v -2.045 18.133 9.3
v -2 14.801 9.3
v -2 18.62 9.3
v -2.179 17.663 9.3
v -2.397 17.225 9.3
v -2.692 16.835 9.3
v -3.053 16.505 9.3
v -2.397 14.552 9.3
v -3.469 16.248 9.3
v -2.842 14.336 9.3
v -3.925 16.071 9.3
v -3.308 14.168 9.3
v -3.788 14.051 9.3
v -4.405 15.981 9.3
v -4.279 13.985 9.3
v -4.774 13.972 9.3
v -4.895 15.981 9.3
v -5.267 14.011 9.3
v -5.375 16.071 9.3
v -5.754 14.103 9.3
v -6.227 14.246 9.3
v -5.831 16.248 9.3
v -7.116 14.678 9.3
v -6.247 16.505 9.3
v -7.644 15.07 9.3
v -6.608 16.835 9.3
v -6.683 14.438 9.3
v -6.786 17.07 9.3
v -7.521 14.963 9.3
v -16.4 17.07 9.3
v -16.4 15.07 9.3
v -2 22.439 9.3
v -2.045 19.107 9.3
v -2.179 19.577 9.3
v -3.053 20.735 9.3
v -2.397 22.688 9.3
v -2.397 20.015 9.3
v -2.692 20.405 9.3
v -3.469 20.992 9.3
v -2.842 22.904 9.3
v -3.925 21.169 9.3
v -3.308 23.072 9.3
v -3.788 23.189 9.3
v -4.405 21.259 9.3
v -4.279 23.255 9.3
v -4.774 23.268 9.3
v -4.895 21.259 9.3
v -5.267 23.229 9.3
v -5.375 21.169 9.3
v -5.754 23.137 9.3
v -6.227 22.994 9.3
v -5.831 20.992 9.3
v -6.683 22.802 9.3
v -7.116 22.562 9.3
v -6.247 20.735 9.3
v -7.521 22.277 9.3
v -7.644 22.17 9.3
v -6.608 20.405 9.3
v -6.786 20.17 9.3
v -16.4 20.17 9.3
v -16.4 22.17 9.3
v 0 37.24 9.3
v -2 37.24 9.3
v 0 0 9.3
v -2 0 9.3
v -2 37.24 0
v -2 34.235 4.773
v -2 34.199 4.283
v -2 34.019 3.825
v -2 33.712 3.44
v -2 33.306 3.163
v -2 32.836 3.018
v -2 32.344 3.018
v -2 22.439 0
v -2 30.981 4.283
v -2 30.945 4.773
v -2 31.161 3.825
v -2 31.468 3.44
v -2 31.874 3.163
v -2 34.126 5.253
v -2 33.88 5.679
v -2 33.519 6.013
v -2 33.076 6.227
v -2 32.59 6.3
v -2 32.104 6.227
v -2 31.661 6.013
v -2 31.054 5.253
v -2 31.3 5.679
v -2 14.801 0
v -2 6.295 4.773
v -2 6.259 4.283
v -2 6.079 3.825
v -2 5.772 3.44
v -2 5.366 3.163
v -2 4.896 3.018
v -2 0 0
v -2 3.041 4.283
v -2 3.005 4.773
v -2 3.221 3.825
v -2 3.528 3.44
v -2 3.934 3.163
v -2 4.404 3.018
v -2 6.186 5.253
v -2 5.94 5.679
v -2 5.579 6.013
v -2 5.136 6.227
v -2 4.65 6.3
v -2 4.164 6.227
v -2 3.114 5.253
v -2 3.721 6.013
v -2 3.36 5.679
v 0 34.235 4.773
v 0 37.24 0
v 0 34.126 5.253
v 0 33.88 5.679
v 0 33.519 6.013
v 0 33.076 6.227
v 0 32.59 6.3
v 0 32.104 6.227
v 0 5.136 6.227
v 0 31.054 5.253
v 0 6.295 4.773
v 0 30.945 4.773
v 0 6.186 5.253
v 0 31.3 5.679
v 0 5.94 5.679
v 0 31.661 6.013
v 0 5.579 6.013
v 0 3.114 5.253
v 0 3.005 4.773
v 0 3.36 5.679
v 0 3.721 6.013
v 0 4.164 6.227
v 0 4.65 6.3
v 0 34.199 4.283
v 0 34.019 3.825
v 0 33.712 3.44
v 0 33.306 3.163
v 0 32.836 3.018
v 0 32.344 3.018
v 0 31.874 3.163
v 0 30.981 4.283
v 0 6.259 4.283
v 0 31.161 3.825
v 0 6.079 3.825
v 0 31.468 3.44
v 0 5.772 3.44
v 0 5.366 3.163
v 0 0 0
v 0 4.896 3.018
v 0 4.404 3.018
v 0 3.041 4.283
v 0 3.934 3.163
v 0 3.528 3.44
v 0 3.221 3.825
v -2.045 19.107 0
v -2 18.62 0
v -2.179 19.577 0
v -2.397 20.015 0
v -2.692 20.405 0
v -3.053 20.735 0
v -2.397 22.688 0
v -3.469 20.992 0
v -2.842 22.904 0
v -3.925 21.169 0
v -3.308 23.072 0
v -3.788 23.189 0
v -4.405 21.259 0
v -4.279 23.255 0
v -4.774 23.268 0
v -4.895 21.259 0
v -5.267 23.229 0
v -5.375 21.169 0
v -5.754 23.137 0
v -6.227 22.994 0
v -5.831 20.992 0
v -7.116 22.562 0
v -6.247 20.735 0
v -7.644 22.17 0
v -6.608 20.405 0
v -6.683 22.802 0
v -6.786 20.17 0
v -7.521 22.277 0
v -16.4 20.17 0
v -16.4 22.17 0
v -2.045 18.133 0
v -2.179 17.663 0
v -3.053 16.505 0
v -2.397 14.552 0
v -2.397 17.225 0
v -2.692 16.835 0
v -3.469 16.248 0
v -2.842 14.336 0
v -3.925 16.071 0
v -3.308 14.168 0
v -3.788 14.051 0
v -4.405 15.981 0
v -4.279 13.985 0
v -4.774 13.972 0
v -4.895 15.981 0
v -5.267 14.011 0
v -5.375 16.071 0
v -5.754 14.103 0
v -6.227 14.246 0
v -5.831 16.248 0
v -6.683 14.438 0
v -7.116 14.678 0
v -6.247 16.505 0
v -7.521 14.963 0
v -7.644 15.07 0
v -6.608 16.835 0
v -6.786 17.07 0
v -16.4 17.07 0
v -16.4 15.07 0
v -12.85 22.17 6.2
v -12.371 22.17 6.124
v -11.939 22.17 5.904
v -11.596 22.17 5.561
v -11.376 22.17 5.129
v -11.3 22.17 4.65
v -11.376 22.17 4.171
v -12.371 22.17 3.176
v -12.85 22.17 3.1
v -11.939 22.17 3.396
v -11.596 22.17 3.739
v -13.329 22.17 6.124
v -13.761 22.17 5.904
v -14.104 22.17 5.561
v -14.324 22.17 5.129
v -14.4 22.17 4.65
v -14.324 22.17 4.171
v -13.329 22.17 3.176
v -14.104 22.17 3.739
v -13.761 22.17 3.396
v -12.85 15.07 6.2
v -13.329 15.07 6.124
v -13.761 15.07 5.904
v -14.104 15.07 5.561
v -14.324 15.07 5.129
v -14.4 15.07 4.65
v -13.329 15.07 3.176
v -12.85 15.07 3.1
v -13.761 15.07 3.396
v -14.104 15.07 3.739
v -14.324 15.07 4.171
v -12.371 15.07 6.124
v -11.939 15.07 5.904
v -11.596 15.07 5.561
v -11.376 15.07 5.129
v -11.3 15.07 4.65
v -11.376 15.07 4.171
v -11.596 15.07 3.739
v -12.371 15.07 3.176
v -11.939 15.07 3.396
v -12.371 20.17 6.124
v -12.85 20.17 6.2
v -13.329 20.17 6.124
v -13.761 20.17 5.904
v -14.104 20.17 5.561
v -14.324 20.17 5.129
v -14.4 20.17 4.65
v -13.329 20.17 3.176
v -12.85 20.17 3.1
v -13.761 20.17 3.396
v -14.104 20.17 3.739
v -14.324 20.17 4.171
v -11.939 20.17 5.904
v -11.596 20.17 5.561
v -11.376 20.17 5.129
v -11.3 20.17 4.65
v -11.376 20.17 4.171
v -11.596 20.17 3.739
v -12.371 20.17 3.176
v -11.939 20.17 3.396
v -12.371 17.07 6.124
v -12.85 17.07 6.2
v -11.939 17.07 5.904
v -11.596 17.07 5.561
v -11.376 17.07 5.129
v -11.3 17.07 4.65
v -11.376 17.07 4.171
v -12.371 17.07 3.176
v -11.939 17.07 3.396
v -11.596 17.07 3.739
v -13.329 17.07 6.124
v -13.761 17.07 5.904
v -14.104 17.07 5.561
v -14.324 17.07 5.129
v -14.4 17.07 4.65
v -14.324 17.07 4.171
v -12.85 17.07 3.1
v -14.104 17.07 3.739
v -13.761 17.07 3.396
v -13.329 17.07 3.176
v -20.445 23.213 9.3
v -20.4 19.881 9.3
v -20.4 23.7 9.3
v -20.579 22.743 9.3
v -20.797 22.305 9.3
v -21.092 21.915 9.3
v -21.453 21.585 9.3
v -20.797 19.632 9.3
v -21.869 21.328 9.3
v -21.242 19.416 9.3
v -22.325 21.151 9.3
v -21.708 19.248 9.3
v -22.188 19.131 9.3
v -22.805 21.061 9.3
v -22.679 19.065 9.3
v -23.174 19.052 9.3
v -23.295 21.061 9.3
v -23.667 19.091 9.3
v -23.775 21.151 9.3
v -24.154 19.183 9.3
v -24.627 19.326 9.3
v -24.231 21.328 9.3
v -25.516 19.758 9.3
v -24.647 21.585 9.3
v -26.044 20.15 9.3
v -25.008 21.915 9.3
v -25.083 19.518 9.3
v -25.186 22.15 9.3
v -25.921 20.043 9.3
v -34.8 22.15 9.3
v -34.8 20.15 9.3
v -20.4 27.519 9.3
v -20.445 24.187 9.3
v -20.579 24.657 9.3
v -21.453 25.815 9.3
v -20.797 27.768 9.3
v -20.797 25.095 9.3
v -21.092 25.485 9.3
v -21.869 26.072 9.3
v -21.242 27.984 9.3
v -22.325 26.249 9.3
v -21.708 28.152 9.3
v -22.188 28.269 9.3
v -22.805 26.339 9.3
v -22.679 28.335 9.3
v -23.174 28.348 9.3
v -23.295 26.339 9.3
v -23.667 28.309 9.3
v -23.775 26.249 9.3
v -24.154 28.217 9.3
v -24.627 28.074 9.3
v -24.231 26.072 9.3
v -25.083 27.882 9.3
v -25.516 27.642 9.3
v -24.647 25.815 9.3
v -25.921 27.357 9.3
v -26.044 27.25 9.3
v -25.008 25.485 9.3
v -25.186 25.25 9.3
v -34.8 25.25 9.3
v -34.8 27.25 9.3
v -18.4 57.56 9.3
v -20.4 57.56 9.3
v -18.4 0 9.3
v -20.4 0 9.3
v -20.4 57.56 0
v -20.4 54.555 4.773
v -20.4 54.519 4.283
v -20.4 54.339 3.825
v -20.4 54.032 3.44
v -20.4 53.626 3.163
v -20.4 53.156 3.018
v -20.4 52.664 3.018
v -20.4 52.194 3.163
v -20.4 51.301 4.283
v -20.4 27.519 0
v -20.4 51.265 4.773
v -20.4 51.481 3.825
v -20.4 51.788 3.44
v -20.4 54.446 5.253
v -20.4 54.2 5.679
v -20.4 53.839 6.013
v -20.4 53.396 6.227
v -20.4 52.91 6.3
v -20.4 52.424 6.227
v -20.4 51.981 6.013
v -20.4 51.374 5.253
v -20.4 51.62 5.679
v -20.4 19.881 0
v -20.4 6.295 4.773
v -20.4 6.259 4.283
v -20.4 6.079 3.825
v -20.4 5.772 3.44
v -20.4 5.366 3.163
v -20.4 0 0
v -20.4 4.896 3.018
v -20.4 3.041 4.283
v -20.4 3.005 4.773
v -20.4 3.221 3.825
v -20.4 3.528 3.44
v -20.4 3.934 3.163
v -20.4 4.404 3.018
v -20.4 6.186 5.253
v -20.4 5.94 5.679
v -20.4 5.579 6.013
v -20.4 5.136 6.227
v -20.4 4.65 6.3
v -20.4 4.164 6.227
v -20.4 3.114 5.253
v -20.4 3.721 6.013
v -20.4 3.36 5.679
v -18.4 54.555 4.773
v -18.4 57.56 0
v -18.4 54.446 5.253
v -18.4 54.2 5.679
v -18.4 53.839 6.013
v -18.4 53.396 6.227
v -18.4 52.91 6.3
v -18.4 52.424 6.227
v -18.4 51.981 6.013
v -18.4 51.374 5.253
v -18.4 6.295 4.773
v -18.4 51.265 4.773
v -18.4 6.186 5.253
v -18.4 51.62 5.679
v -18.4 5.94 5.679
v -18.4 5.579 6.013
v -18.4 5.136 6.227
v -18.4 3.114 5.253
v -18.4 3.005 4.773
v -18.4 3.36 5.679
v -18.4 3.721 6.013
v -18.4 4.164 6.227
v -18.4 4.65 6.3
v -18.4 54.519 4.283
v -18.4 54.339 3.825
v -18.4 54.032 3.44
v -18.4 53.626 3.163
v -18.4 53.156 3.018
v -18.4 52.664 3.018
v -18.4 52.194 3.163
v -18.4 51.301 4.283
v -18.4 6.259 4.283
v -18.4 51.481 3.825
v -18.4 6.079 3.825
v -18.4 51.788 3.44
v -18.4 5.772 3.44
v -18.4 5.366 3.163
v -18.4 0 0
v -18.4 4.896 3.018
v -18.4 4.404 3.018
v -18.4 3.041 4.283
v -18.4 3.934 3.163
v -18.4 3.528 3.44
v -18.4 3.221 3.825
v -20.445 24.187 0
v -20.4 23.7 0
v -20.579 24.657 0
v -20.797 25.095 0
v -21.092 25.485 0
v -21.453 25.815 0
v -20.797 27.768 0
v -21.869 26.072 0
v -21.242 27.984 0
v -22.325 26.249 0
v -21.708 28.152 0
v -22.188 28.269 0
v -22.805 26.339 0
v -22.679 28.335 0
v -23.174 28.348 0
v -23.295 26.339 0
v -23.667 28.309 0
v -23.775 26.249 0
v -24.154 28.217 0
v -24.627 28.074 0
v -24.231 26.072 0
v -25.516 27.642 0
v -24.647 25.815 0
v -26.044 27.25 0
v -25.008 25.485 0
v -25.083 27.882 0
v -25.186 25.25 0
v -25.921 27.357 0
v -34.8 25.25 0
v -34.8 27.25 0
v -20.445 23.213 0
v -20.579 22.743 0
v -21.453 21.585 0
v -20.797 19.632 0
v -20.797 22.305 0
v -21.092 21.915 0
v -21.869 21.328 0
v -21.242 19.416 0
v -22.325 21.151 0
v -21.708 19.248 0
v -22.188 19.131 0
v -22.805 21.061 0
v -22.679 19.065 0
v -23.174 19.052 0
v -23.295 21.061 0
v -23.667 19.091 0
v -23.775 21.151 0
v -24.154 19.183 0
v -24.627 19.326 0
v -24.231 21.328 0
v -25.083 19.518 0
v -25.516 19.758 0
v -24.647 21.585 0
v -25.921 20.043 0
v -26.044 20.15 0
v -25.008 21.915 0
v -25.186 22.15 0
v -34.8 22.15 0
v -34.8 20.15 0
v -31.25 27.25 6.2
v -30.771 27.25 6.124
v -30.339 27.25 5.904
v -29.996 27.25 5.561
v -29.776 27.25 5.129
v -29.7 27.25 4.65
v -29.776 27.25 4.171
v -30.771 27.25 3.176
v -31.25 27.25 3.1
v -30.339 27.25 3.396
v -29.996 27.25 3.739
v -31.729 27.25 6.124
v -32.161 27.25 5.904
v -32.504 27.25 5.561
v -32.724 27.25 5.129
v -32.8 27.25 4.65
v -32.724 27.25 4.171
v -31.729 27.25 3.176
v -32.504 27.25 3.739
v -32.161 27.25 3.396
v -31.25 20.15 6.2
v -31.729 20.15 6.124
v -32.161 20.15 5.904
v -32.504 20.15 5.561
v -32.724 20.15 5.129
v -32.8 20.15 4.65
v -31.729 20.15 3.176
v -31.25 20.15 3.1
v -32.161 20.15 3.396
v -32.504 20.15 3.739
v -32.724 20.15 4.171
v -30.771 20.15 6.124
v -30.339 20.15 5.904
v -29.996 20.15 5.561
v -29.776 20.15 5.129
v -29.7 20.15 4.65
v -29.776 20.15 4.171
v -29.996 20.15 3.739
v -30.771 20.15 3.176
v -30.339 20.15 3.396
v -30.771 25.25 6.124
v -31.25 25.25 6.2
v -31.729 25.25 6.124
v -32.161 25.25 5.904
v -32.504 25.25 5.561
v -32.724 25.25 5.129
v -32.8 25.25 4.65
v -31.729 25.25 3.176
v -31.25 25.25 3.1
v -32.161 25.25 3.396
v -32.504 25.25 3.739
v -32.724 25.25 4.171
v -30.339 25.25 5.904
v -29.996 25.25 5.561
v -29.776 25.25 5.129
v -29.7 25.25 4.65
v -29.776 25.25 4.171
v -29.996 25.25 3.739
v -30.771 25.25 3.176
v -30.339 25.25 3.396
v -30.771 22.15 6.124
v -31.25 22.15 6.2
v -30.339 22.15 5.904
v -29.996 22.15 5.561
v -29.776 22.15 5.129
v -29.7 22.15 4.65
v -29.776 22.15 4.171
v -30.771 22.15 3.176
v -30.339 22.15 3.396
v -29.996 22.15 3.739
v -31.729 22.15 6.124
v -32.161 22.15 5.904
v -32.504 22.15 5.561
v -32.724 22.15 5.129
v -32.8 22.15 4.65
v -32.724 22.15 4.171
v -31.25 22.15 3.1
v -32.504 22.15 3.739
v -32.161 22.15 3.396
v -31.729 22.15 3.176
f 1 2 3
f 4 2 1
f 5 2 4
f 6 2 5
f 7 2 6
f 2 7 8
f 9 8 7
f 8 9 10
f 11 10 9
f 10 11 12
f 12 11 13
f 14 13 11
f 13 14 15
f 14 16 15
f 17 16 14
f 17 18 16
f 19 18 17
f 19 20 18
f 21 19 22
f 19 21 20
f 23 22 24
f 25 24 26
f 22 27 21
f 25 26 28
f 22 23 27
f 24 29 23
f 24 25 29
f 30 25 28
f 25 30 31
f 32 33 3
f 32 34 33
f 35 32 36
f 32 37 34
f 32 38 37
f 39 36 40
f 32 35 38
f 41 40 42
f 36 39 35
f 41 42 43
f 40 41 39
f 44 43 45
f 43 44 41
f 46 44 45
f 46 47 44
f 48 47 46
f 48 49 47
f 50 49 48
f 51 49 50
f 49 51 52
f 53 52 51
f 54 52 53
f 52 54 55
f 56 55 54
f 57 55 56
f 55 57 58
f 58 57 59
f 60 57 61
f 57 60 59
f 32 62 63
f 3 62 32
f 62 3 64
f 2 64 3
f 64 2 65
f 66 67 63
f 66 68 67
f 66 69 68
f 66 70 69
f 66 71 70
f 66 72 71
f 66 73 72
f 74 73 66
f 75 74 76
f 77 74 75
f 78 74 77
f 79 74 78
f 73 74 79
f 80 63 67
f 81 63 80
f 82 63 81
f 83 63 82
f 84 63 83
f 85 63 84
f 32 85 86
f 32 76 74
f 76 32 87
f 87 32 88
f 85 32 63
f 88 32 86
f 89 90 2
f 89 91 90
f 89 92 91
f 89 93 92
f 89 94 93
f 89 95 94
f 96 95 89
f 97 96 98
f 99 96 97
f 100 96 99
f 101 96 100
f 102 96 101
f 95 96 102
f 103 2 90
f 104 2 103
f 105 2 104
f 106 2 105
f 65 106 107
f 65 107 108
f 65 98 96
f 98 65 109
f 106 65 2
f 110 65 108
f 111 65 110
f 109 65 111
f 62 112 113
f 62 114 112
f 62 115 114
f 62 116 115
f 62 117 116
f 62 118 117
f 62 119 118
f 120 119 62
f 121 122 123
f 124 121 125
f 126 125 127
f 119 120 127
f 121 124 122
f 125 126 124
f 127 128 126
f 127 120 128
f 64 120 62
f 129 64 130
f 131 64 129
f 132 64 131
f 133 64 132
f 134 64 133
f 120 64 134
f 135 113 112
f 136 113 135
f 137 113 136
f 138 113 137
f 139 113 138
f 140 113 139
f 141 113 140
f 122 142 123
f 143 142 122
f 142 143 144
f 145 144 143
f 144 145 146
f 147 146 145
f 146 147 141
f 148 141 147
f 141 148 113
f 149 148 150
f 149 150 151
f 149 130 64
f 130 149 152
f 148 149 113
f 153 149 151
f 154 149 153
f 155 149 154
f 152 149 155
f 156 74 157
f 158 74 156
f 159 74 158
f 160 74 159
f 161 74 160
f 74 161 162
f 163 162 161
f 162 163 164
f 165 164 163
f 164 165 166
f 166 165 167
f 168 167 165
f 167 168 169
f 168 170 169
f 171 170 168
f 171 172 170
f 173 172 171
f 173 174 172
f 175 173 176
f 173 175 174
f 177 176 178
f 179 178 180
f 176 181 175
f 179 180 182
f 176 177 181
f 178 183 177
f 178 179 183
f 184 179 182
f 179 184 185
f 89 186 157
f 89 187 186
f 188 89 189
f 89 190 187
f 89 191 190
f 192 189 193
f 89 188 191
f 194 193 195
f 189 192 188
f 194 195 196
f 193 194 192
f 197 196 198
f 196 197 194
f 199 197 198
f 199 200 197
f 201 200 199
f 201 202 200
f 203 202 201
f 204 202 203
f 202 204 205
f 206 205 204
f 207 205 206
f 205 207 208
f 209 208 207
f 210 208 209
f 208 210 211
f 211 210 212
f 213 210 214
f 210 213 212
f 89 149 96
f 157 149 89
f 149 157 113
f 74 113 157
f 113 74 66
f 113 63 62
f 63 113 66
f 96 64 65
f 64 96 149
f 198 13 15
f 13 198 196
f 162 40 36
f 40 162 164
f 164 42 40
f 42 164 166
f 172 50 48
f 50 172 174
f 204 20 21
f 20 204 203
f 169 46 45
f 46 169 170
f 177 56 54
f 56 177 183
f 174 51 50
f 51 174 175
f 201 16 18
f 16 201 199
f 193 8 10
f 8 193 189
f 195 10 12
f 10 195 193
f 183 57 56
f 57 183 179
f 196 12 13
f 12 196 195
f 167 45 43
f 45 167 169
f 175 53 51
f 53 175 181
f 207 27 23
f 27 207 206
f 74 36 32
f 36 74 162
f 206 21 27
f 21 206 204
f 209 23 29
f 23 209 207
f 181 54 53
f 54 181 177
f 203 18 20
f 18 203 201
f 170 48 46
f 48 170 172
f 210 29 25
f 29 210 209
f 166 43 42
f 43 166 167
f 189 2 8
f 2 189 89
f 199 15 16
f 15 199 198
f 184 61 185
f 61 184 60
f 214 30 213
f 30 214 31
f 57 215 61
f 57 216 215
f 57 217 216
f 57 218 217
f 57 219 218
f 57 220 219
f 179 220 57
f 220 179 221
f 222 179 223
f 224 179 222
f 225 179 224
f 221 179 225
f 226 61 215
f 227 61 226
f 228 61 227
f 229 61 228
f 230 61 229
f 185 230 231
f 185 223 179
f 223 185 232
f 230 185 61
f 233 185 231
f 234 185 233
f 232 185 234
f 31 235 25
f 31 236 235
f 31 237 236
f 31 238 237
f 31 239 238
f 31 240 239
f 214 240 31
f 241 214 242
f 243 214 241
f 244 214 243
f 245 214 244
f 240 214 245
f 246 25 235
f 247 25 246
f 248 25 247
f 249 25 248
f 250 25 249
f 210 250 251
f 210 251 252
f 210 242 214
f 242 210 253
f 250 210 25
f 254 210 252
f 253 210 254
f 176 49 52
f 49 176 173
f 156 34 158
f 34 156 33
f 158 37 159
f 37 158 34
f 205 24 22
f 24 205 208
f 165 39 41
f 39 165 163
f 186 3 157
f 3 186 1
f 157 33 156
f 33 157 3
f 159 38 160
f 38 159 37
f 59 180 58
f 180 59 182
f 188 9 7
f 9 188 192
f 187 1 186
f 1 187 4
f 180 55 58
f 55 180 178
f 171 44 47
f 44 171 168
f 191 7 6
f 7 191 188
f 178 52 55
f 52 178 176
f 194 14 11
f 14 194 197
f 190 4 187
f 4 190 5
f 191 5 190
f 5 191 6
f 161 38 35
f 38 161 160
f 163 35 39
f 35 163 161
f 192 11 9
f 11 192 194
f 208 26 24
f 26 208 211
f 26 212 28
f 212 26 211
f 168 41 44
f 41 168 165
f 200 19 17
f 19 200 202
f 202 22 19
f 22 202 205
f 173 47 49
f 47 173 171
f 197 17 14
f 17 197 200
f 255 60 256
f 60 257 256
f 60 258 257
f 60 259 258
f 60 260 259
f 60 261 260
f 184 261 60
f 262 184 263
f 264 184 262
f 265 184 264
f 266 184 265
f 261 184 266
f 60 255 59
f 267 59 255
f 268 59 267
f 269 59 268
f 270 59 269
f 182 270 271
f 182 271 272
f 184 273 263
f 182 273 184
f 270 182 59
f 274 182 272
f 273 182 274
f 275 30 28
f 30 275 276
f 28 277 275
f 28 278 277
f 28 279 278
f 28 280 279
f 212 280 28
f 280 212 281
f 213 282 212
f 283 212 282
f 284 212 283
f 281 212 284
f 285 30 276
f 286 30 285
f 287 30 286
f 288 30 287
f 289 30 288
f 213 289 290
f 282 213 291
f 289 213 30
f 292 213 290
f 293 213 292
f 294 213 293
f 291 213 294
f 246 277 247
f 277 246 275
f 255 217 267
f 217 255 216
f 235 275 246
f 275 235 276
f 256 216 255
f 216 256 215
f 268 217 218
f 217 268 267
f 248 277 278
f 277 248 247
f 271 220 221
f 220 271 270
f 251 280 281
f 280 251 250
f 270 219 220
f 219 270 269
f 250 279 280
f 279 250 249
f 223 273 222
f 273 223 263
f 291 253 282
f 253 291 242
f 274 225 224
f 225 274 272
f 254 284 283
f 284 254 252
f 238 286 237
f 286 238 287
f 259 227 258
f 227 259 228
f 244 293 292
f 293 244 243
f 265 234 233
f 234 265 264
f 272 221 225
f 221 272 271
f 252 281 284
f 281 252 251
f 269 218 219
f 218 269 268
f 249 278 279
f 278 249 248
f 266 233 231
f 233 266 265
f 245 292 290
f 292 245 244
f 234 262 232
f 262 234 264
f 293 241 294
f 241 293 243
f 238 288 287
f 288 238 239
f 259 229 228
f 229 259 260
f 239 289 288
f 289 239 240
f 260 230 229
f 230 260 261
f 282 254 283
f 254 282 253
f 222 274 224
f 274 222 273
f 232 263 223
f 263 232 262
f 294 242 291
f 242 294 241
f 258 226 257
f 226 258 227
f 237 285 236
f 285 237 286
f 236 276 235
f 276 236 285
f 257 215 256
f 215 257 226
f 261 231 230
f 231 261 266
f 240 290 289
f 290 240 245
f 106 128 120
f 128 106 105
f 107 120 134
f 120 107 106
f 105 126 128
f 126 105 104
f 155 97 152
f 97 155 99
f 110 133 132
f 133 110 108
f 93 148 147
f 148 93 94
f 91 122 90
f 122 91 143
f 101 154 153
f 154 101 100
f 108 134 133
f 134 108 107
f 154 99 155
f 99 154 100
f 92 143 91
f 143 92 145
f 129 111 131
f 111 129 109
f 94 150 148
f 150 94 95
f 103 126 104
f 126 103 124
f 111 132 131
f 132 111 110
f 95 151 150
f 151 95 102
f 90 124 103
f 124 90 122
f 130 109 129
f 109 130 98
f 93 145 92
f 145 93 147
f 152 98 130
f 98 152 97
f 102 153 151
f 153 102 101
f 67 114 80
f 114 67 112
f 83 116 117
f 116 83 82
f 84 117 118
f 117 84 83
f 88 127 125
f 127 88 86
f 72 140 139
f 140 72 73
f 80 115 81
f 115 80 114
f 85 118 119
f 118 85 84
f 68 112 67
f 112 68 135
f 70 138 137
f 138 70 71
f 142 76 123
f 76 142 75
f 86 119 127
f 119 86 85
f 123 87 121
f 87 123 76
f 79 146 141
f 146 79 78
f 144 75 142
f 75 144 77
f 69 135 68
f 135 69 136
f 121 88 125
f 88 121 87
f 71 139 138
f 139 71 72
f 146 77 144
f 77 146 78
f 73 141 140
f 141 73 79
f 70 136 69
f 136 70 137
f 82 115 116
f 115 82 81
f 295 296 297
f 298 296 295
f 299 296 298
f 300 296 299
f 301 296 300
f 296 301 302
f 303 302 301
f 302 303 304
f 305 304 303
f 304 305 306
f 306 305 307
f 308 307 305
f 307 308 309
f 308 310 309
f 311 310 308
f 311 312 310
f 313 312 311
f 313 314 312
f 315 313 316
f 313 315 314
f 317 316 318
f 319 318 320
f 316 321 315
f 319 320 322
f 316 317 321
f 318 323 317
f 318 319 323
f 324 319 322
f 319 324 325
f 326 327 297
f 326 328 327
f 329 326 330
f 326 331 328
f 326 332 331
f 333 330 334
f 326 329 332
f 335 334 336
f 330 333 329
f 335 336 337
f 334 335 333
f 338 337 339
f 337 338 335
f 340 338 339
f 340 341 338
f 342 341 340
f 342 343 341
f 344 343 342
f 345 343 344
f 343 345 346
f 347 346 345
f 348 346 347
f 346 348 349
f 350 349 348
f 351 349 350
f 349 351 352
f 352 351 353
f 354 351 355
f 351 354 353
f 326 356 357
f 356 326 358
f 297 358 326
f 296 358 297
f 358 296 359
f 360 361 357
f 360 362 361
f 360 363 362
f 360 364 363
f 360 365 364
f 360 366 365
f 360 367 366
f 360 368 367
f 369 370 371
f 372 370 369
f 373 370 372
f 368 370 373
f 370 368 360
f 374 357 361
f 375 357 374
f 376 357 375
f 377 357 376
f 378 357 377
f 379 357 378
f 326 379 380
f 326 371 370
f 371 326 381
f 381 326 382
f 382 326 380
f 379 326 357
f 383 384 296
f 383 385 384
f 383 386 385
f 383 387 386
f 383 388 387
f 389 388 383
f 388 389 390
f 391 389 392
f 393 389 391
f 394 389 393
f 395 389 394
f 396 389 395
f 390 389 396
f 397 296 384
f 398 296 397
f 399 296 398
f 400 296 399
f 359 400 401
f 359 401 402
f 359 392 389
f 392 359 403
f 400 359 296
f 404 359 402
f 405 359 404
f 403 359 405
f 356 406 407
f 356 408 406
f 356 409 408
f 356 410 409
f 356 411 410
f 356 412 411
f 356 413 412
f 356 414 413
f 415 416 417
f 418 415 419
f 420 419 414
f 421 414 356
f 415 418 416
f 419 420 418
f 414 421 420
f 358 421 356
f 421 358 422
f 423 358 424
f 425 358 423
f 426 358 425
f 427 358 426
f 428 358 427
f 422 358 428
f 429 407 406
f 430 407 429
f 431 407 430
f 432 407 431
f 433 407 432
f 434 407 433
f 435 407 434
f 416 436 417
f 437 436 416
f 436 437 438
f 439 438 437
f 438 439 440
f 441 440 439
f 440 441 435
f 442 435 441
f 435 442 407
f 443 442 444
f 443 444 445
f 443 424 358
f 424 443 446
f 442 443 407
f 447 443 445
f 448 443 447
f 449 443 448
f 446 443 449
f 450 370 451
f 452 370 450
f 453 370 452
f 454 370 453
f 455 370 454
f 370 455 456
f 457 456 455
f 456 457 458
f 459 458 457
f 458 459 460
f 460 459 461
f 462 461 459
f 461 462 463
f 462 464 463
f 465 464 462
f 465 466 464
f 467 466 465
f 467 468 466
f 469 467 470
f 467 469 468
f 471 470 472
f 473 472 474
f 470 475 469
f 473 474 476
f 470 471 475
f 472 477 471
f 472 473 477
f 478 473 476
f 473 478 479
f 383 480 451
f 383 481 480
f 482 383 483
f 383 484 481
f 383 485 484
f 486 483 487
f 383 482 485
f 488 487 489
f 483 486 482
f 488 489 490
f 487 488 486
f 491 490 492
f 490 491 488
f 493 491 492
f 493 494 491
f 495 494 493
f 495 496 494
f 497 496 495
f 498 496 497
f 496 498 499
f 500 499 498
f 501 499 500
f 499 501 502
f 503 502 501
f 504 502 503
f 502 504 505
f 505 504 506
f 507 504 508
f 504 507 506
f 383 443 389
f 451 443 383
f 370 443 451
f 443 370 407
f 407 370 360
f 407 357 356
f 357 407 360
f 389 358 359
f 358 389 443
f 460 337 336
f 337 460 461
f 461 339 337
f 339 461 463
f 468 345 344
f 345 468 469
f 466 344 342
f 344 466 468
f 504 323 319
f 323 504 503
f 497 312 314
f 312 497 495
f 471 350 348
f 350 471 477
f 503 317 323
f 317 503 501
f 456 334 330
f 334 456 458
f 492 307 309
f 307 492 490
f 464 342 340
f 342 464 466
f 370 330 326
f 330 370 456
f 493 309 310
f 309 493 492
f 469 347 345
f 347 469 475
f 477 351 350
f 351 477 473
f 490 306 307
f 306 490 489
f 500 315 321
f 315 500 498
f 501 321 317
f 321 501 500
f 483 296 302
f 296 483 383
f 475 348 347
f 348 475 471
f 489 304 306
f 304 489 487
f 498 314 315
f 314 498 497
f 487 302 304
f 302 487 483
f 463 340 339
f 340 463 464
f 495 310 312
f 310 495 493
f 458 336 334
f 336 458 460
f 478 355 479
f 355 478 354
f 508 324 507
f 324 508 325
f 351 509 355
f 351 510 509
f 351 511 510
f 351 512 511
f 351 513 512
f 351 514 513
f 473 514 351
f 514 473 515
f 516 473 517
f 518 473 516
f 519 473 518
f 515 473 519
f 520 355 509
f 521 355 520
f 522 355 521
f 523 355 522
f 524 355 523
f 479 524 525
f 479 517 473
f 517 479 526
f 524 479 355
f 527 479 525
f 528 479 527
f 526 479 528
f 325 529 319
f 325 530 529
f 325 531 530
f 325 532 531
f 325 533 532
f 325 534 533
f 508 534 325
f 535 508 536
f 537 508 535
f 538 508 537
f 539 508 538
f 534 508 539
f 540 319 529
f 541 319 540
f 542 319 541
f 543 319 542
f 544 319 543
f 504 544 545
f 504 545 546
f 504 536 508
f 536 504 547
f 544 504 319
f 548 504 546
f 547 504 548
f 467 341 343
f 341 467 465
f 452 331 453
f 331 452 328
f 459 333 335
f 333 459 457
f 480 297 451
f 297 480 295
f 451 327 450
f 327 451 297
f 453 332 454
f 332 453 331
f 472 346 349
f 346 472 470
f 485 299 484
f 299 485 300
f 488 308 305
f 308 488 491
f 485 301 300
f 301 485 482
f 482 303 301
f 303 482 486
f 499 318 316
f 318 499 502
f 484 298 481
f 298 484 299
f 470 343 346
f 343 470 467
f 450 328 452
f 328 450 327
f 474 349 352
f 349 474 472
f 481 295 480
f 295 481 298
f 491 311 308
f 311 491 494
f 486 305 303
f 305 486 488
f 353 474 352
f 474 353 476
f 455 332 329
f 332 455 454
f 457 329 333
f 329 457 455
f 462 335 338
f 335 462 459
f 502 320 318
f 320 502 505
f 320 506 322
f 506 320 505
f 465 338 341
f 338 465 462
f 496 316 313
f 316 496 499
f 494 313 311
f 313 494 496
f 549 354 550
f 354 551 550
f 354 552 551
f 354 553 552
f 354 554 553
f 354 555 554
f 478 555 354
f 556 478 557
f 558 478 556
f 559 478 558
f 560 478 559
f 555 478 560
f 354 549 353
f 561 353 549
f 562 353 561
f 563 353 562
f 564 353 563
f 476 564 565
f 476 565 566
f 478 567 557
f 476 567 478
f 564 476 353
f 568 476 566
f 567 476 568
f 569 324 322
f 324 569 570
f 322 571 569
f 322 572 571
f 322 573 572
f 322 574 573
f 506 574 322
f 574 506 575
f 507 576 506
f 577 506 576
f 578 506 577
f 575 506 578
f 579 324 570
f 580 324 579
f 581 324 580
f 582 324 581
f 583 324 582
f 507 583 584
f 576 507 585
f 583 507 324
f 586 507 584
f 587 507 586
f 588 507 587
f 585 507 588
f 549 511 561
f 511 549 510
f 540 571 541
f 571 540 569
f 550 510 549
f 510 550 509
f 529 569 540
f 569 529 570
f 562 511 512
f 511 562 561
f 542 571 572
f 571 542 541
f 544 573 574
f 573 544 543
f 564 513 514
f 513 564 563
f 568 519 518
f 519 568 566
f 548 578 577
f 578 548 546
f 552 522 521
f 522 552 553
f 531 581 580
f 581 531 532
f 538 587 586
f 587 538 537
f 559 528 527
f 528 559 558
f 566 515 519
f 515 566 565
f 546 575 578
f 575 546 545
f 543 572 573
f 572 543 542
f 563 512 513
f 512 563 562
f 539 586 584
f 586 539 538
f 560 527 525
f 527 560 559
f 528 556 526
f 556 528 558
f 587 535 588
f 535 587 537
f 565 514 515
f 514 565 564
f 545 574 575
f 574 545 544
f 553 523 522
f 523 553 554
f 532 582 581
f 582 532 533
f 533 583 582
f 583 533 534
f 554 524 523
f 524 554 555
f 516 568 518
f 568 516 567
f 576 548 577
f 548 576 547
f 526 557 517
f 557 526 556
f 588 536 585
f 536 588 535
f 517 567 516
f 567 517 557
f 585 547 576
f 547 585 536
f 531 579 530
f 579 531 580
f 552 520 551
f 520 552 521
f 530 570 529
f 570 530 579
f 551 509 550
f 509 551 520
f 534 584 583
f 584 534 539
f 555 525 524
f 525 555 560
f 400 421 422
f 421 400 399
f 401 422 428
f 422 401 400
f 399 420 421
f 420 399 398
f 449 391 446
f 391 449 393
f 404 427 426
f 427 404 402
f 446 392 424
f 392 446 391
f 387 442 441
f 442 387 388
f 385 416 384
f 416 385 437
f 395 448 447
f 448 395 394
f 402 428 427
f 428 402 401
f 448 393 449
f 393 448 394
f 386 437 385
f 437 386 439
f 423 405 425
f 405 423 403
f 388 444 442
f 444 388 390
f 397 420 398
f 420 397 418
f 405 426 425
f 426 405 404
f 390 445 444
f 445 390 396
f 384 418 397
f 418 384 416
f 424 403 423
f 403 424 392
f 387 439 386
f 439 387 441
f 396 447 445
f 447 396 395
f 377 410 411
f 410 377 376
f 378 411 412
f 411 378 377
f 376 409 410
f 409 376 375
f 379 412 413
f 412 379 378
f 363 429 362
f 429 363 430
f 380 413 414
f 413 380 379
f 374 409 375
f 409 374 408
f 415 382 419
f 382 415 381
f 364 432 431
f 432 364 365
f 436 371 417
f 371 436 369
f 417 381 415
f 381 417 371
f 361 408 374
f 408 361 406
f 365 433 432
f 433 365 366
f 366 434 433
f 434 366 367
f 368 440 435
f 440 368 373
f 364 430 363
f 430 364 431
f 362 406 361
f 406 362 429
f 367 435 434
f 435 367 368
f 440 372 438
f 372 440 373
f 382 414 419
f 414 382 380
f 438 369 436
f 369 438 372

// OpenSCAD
// Arduino support

// Resolution
$fa = 3; // Minimum angle (lower = higher max resolution, def 12)
$fs = 0.5; // Max fragment size (lower = higher min resolution, def 2)

// Measured parameters
holder_diam = 5.3;
hole_diam = 3.3;
dist_small = 27.94;
dist_large = 48.26;
screw_diam = 3.1;
center_offset = 5.08;

// Support parameters
depth = 2;
hole_space = 3;
screw_space = 2;
hole_size = (holder_diam + depth*2) / 3;

// Generic support
module support(dist, offset) {
	difference() {
		union() {
			// Base
			cube([hole_diam + hole_space * 2, dist + hole_diam + hole_space * 2, depth]);
			// Holder holder
			translate([0, dist/2 + hole_diam/2 + hole_space + offset, holder_diam/2 + depth])
				rotate([0, 90, 0])
					cylinder(r = holder_diam/2 + depth, h = hole_diam + hole_space * 2);
			// Holder screw support
			translate([0, dist/2 + hole_diam/2 + hole_space + offset - (hole_size + depth*2)/2, holder_diam/2 + depth])
				cube([hole_diam + hole_space * 2, hole_size + depth * 2, holder_diam/2 + depth + screw_diam + screw_space*2]);
		}
		// Holder space
		translate([0, dist/2 + hole_diam/2 + hole_space + offset, holder_diam/2 + depth])
			rotate([0, 90, 0])
				cylinder(r = holder_diam/2, h = hole_diam + hole_space * 2);
		// Holder screw support hole
		translate([0, dist/2 + hole_diam/2 + hole_space + offset - (hole_size + depth*2)/2 + depth, holder_diam/2 + depth])
			cube([hole_diam + hole_space * 2, hole_size, holder_diam/2 + depth + screw_diam + screw_space*2]);	
		// Holder screw space
		translate([hole_diam/2 + hole_space, dist/2 + hole_diam/2 + hole_space + offset - (hole_size + depth*2)/2, 2* depth + holder_diam + screw_space + screw_diam / 2])
			rotate([-90, 0, 0])
				cylinder(r = screw_diam/2, h = hole_size + depth * 2);
		// Arduino connection holes 
		translate([hole_space + hole_diam/2, hole_space + hole_diam/2, 0])
			cylinder(r = hole_diam/2, h = depth);
		translate([hole_space + hole_diam/2, hole_space + hole_diam/2 + dist, 0])
			cylinder(r = hole_diam/2, h = depth);
	}
}

// Small support
rotate([0, -90, 0]) 
	support(dist_small, 0);
// Big support
translate([-holder_diam - screw_diam - screw_space * 2 - depth*3, 0, 0])
	rotate([0, -90, 0]) 
		support(dist_large, -center_offset);
